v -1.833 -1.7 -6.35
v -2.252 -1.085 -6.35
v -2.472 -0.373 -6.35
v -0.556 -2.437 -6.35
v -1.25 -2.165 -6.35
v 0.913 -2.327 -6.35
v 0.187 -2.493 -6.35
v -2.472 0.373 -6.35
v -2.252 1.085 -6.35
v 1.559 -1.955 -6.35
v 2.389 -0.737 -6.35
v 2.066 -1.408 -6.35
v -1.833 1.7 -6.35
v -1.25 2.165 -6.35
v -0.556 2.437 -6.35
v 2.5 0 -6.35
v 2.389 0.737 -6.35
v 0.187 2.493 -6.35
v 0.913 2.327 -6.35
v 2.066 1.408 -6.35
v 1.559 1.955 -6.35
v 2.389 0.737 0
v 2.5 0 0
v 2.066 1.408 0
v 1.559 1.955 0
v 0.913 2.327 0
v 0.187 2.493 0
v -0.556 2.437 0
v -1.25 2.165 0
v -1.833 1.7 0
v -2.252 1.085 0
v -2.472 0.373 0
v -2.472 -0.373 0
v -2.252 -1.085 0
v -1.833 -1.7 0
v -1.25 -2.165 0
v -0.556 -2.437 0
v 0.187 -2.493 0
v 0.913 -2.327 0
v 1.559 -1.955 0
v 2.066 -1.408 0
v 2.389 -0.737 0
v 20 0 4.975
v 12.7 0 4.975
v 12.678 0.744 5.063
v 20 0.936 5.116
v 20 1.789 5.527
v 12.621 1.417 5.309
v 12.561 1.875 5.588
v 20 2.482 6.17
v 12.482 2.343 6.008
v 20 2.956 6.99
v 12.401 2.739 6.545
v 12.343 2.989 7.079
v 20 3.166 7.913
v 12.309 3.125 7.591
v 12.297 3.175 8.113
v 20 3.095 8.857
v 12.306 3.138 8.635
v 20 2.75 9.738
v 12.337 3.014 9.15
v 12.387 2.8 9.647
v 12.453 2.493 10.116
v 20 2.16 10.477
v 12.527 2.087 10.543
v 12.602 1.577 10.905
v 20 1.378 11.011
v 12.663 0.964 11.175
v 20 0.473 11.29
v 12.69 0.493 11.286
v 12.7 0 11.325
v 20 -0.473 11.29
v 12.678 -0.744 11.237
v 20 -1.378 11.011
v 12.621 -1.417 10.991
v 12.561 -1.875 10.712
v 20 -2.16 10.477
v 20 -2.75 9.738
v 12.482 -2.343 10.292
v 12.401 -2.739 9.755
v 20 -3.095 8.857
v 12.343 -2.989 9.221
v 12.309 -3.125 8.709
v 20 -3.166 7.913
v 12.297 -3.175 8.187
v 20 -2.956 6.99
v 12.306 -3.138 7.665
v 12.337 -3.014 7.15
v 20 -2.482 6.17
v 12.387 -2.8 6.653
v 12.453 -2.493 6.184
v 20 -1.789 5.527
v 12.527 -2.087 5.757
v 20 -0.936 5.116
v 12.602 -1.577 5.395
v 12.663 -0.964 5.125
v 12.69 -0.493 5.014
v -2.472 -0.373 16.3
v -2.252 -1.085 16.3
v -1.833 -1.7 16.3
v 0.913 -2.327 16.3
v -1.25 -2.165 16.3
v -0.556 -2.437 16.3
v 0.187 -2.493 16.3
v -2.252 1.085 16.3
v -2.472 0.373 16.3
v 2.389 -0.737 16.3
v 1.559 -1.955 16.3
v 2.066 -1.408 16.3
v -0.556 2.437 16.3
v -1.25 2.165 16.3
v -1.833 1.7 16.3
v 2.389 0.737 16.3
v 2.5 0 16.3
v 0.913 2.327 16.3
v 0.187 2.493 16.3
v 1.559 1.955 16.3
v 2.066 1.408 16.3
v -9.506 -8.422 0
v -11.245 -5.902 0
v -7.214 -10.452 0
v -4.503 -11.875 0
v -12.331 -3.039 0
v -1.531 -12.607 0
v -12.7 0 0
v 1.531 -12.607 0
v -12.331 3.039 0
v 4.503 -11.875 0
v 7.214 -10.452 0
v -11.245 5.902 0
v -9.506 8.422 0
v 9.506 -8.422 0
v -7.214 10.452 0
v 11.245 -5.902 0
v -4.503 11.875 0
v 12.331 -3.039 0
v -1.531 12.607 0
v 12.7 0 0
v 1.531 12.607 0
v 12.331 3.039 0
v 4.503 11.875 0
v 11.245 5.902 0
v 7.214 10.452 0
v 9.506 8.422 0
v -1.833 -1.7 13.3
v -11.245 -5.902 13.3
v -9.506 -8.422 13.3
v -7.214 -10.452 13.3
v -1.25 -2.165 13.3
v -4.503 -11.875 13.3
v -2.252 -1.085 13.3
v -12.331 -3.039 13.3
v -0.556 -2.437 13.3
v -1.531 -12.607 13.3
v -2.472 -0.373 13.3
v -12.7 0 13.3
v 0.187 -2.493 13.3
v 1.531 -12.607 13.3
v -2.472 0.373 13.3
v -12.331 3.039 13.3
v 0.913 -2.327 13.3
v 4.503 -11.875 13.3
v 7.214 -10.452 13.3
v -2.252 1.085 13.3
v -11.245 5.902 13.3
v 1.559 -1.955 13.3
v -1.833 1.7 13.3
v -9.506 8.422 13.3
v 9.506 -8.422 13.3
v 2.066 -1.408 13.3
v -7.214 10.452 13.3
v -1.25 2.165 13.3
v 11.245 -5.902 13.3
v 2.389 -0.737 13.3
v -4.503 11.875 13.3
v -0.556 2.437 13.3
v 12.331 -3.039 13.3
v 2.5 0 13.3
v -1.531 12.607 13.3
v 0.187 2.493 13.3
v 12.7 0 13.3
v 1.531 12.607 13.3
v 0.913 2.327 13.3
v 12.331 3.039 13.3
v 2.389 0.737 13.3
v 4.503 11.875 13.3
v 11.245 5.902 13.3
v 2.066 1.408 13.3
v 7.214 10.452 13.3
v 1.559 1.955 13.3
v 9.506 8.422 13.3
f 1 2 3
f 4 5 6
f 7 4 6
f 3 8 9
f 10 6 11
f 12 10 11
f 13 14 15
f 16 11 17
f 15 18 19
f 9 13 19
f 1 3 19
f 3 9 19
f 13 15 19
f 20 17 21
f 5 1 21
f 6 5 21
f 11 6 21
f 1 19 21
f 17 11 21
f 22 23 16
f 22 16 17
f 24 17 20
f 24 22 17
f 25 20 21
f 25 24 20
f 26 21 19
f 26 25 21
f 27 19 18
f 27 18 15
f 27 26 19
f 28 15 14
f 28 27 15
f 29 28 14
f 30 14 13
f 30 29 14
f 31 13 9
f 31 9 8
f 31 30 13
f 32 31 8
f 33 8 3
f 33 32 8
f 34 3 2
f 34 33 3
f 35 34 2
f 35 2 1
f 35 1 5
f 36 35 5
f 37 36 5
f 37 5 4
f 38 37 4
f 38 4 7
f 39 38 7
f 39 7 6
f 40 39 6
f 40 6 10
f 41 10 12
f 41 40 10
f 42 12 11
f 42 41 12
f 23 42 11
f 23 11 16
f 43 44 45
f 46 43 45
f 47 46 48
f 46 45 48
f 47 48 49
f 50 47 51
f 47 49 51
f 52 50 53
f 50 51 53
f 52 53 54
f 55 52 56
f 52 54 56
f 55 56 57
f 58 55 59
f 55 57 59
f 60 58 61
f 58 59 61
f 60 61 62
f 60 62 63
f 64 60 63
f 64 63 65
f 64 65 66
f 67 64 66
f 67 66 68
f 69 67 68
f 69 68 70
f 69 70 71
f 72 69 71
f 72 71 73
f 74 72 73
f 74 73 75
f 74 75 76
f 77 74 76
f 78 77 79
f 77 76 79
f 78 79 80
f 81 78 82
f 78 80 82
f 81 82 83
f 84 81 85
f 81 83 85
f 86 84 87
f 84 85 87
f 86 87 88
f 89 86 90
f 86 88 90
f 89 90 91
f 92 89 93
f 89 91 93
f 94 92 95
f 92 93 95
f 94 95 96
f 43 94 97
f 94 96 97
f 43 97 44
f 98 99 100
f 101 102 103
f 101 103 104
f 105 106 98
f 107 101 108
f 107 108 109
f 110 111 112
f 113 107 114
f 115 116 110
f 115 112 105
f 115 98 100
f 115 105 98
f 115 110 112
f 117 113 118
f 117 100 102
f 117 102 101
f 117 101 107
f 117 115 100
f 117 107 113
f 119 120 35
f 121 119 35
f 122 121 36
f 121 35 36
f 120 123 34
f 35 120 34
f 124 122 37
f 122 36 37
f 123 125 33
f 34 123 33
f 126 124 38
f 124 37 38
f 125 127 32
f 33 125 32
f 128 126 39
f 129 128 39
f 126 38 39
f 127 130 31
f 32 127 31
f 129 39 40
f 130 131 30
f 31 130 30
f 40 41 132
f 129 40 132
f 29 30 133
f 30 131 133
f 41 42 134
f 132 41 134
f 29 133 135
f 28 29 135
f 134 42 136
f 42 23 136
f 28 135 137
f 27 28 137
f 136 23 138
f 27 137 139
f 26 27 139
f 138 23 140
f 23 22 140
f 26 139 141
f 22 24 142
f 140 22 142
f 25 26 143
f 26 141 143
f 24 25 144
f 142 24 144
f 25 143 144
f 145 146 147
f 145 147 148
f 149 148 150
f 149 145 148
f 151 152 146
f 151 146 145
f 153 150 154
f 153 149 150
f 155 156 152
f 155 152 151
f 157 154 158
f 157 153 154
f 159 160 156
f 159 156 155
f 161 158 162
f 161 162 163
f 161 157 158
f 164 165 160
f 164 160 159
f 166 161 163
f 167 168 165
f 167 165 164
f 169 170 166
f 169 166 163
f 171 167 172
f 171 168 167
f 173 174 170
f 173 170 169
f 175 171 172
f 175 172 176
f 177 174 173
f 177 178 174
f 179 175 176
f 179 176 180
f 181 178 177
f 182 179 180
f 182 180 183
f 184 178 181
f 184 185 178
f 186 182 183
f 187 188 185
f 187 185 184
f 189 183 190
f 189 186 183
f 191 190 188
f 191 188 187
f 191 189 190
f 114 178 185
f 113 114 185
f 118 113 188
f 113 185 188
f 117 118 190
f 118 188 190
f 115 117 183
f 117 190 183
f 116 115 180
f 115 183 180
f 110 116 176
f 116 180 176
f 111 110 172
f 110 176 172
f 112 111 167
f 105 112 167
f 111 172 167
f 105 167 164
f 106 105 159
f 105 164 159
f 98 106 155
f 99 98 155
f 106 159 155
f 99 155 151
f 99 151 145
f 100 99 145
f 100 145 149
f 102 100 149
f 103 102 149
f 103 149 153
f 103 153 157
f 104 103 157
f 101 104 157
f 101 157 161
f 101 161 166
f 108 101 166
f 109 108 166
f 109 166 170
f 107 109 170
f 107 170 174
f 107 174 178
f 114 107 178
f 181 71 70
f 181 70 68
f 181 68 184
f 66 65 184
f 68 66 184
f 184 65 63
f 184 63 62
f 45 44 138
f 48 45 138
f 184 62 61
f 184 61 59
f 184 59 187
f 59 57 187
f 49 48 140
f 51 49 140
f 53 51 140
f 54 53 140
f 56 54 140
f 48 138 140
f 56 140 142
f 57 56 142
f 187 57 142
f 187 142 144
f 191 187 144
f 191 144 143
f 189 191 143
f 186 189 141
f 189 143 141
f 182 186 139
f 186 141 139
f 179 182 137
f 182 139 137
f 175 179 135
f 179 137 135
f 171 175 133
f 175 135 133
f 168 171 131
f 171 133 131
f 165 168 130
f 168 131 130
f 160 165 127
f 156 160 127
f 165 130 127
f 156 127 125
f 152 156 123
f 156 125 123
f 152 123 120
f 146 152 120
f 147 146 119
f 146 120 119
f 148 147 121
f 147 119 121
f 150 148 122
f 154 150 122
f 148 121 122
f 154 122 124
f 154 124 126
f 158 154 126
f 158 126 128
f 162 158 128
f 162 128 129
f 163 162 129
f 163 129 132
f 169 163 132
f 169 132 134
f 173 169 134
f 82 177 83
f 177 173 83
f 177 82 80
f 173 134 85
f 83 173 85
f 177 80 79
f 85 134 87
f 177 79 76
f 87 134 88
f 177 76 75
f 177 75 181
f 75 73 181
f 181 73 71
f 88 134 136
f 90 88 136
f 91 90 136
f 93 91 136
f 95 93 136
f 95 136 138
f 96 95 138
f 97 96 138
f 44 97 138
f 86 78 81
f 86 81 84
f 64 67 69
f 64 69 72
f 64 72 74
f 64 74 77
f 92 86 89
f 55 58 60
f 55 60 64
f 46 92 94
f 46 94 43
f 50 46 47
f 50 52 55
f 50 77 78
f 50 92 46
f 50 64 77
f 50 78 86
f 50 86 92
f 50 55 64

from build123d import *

# Parameters (mm, degrees)
SKETCH1_R                = 12.7
BOSS_EXTRUDE1_DEPTH      = 13.3
BOSS_EXTRUDE2_DEPTH      = 16.3
BOSS_EXTRUDE2_DEPTH_BACK = 6.35
SKETCH1_3_R              = 2.5
SKETCH2_R                = 3.175
BOSS_EXTRUDE3_DEPTH      = 20


with BuildPart() as part:
    # Sketch1 → Boss-Extrude1 (new body)
    with BuildSketch(Plane.XY):
        Circle(SKETCH1_R)
    extrude(amount=BOSS_EXTRUDE1_DEPTH)

    # Sketch1<3> → Boss-Extrude2 (add, two sides: drawn at the far end of the back side and taken through both)
    with BuildSketch(Plane.XY.offset(-BOSS_EXTRUDE2_DEPTH_BACK)):
        Circle(SKETCH1_3_R)
    extrude(amount=BOSS_EXTRUDE2_DEPTH + BOSS_EXTRUDE2_DEPTH_BACK)

    # Sketch2 → Boss-Extrude3 (add)
    with BuildSketch(Plane(origin=(0, 0, 0), x_dir=(0, 0, -1), z_dir=(1, 0, 0))):
        with Locations((-8.15, 0)):
            Circle(SKETCH2_R)
    extrude(amount=BOSS_EXTRUDE3_DEPTH)


solid = part.part
